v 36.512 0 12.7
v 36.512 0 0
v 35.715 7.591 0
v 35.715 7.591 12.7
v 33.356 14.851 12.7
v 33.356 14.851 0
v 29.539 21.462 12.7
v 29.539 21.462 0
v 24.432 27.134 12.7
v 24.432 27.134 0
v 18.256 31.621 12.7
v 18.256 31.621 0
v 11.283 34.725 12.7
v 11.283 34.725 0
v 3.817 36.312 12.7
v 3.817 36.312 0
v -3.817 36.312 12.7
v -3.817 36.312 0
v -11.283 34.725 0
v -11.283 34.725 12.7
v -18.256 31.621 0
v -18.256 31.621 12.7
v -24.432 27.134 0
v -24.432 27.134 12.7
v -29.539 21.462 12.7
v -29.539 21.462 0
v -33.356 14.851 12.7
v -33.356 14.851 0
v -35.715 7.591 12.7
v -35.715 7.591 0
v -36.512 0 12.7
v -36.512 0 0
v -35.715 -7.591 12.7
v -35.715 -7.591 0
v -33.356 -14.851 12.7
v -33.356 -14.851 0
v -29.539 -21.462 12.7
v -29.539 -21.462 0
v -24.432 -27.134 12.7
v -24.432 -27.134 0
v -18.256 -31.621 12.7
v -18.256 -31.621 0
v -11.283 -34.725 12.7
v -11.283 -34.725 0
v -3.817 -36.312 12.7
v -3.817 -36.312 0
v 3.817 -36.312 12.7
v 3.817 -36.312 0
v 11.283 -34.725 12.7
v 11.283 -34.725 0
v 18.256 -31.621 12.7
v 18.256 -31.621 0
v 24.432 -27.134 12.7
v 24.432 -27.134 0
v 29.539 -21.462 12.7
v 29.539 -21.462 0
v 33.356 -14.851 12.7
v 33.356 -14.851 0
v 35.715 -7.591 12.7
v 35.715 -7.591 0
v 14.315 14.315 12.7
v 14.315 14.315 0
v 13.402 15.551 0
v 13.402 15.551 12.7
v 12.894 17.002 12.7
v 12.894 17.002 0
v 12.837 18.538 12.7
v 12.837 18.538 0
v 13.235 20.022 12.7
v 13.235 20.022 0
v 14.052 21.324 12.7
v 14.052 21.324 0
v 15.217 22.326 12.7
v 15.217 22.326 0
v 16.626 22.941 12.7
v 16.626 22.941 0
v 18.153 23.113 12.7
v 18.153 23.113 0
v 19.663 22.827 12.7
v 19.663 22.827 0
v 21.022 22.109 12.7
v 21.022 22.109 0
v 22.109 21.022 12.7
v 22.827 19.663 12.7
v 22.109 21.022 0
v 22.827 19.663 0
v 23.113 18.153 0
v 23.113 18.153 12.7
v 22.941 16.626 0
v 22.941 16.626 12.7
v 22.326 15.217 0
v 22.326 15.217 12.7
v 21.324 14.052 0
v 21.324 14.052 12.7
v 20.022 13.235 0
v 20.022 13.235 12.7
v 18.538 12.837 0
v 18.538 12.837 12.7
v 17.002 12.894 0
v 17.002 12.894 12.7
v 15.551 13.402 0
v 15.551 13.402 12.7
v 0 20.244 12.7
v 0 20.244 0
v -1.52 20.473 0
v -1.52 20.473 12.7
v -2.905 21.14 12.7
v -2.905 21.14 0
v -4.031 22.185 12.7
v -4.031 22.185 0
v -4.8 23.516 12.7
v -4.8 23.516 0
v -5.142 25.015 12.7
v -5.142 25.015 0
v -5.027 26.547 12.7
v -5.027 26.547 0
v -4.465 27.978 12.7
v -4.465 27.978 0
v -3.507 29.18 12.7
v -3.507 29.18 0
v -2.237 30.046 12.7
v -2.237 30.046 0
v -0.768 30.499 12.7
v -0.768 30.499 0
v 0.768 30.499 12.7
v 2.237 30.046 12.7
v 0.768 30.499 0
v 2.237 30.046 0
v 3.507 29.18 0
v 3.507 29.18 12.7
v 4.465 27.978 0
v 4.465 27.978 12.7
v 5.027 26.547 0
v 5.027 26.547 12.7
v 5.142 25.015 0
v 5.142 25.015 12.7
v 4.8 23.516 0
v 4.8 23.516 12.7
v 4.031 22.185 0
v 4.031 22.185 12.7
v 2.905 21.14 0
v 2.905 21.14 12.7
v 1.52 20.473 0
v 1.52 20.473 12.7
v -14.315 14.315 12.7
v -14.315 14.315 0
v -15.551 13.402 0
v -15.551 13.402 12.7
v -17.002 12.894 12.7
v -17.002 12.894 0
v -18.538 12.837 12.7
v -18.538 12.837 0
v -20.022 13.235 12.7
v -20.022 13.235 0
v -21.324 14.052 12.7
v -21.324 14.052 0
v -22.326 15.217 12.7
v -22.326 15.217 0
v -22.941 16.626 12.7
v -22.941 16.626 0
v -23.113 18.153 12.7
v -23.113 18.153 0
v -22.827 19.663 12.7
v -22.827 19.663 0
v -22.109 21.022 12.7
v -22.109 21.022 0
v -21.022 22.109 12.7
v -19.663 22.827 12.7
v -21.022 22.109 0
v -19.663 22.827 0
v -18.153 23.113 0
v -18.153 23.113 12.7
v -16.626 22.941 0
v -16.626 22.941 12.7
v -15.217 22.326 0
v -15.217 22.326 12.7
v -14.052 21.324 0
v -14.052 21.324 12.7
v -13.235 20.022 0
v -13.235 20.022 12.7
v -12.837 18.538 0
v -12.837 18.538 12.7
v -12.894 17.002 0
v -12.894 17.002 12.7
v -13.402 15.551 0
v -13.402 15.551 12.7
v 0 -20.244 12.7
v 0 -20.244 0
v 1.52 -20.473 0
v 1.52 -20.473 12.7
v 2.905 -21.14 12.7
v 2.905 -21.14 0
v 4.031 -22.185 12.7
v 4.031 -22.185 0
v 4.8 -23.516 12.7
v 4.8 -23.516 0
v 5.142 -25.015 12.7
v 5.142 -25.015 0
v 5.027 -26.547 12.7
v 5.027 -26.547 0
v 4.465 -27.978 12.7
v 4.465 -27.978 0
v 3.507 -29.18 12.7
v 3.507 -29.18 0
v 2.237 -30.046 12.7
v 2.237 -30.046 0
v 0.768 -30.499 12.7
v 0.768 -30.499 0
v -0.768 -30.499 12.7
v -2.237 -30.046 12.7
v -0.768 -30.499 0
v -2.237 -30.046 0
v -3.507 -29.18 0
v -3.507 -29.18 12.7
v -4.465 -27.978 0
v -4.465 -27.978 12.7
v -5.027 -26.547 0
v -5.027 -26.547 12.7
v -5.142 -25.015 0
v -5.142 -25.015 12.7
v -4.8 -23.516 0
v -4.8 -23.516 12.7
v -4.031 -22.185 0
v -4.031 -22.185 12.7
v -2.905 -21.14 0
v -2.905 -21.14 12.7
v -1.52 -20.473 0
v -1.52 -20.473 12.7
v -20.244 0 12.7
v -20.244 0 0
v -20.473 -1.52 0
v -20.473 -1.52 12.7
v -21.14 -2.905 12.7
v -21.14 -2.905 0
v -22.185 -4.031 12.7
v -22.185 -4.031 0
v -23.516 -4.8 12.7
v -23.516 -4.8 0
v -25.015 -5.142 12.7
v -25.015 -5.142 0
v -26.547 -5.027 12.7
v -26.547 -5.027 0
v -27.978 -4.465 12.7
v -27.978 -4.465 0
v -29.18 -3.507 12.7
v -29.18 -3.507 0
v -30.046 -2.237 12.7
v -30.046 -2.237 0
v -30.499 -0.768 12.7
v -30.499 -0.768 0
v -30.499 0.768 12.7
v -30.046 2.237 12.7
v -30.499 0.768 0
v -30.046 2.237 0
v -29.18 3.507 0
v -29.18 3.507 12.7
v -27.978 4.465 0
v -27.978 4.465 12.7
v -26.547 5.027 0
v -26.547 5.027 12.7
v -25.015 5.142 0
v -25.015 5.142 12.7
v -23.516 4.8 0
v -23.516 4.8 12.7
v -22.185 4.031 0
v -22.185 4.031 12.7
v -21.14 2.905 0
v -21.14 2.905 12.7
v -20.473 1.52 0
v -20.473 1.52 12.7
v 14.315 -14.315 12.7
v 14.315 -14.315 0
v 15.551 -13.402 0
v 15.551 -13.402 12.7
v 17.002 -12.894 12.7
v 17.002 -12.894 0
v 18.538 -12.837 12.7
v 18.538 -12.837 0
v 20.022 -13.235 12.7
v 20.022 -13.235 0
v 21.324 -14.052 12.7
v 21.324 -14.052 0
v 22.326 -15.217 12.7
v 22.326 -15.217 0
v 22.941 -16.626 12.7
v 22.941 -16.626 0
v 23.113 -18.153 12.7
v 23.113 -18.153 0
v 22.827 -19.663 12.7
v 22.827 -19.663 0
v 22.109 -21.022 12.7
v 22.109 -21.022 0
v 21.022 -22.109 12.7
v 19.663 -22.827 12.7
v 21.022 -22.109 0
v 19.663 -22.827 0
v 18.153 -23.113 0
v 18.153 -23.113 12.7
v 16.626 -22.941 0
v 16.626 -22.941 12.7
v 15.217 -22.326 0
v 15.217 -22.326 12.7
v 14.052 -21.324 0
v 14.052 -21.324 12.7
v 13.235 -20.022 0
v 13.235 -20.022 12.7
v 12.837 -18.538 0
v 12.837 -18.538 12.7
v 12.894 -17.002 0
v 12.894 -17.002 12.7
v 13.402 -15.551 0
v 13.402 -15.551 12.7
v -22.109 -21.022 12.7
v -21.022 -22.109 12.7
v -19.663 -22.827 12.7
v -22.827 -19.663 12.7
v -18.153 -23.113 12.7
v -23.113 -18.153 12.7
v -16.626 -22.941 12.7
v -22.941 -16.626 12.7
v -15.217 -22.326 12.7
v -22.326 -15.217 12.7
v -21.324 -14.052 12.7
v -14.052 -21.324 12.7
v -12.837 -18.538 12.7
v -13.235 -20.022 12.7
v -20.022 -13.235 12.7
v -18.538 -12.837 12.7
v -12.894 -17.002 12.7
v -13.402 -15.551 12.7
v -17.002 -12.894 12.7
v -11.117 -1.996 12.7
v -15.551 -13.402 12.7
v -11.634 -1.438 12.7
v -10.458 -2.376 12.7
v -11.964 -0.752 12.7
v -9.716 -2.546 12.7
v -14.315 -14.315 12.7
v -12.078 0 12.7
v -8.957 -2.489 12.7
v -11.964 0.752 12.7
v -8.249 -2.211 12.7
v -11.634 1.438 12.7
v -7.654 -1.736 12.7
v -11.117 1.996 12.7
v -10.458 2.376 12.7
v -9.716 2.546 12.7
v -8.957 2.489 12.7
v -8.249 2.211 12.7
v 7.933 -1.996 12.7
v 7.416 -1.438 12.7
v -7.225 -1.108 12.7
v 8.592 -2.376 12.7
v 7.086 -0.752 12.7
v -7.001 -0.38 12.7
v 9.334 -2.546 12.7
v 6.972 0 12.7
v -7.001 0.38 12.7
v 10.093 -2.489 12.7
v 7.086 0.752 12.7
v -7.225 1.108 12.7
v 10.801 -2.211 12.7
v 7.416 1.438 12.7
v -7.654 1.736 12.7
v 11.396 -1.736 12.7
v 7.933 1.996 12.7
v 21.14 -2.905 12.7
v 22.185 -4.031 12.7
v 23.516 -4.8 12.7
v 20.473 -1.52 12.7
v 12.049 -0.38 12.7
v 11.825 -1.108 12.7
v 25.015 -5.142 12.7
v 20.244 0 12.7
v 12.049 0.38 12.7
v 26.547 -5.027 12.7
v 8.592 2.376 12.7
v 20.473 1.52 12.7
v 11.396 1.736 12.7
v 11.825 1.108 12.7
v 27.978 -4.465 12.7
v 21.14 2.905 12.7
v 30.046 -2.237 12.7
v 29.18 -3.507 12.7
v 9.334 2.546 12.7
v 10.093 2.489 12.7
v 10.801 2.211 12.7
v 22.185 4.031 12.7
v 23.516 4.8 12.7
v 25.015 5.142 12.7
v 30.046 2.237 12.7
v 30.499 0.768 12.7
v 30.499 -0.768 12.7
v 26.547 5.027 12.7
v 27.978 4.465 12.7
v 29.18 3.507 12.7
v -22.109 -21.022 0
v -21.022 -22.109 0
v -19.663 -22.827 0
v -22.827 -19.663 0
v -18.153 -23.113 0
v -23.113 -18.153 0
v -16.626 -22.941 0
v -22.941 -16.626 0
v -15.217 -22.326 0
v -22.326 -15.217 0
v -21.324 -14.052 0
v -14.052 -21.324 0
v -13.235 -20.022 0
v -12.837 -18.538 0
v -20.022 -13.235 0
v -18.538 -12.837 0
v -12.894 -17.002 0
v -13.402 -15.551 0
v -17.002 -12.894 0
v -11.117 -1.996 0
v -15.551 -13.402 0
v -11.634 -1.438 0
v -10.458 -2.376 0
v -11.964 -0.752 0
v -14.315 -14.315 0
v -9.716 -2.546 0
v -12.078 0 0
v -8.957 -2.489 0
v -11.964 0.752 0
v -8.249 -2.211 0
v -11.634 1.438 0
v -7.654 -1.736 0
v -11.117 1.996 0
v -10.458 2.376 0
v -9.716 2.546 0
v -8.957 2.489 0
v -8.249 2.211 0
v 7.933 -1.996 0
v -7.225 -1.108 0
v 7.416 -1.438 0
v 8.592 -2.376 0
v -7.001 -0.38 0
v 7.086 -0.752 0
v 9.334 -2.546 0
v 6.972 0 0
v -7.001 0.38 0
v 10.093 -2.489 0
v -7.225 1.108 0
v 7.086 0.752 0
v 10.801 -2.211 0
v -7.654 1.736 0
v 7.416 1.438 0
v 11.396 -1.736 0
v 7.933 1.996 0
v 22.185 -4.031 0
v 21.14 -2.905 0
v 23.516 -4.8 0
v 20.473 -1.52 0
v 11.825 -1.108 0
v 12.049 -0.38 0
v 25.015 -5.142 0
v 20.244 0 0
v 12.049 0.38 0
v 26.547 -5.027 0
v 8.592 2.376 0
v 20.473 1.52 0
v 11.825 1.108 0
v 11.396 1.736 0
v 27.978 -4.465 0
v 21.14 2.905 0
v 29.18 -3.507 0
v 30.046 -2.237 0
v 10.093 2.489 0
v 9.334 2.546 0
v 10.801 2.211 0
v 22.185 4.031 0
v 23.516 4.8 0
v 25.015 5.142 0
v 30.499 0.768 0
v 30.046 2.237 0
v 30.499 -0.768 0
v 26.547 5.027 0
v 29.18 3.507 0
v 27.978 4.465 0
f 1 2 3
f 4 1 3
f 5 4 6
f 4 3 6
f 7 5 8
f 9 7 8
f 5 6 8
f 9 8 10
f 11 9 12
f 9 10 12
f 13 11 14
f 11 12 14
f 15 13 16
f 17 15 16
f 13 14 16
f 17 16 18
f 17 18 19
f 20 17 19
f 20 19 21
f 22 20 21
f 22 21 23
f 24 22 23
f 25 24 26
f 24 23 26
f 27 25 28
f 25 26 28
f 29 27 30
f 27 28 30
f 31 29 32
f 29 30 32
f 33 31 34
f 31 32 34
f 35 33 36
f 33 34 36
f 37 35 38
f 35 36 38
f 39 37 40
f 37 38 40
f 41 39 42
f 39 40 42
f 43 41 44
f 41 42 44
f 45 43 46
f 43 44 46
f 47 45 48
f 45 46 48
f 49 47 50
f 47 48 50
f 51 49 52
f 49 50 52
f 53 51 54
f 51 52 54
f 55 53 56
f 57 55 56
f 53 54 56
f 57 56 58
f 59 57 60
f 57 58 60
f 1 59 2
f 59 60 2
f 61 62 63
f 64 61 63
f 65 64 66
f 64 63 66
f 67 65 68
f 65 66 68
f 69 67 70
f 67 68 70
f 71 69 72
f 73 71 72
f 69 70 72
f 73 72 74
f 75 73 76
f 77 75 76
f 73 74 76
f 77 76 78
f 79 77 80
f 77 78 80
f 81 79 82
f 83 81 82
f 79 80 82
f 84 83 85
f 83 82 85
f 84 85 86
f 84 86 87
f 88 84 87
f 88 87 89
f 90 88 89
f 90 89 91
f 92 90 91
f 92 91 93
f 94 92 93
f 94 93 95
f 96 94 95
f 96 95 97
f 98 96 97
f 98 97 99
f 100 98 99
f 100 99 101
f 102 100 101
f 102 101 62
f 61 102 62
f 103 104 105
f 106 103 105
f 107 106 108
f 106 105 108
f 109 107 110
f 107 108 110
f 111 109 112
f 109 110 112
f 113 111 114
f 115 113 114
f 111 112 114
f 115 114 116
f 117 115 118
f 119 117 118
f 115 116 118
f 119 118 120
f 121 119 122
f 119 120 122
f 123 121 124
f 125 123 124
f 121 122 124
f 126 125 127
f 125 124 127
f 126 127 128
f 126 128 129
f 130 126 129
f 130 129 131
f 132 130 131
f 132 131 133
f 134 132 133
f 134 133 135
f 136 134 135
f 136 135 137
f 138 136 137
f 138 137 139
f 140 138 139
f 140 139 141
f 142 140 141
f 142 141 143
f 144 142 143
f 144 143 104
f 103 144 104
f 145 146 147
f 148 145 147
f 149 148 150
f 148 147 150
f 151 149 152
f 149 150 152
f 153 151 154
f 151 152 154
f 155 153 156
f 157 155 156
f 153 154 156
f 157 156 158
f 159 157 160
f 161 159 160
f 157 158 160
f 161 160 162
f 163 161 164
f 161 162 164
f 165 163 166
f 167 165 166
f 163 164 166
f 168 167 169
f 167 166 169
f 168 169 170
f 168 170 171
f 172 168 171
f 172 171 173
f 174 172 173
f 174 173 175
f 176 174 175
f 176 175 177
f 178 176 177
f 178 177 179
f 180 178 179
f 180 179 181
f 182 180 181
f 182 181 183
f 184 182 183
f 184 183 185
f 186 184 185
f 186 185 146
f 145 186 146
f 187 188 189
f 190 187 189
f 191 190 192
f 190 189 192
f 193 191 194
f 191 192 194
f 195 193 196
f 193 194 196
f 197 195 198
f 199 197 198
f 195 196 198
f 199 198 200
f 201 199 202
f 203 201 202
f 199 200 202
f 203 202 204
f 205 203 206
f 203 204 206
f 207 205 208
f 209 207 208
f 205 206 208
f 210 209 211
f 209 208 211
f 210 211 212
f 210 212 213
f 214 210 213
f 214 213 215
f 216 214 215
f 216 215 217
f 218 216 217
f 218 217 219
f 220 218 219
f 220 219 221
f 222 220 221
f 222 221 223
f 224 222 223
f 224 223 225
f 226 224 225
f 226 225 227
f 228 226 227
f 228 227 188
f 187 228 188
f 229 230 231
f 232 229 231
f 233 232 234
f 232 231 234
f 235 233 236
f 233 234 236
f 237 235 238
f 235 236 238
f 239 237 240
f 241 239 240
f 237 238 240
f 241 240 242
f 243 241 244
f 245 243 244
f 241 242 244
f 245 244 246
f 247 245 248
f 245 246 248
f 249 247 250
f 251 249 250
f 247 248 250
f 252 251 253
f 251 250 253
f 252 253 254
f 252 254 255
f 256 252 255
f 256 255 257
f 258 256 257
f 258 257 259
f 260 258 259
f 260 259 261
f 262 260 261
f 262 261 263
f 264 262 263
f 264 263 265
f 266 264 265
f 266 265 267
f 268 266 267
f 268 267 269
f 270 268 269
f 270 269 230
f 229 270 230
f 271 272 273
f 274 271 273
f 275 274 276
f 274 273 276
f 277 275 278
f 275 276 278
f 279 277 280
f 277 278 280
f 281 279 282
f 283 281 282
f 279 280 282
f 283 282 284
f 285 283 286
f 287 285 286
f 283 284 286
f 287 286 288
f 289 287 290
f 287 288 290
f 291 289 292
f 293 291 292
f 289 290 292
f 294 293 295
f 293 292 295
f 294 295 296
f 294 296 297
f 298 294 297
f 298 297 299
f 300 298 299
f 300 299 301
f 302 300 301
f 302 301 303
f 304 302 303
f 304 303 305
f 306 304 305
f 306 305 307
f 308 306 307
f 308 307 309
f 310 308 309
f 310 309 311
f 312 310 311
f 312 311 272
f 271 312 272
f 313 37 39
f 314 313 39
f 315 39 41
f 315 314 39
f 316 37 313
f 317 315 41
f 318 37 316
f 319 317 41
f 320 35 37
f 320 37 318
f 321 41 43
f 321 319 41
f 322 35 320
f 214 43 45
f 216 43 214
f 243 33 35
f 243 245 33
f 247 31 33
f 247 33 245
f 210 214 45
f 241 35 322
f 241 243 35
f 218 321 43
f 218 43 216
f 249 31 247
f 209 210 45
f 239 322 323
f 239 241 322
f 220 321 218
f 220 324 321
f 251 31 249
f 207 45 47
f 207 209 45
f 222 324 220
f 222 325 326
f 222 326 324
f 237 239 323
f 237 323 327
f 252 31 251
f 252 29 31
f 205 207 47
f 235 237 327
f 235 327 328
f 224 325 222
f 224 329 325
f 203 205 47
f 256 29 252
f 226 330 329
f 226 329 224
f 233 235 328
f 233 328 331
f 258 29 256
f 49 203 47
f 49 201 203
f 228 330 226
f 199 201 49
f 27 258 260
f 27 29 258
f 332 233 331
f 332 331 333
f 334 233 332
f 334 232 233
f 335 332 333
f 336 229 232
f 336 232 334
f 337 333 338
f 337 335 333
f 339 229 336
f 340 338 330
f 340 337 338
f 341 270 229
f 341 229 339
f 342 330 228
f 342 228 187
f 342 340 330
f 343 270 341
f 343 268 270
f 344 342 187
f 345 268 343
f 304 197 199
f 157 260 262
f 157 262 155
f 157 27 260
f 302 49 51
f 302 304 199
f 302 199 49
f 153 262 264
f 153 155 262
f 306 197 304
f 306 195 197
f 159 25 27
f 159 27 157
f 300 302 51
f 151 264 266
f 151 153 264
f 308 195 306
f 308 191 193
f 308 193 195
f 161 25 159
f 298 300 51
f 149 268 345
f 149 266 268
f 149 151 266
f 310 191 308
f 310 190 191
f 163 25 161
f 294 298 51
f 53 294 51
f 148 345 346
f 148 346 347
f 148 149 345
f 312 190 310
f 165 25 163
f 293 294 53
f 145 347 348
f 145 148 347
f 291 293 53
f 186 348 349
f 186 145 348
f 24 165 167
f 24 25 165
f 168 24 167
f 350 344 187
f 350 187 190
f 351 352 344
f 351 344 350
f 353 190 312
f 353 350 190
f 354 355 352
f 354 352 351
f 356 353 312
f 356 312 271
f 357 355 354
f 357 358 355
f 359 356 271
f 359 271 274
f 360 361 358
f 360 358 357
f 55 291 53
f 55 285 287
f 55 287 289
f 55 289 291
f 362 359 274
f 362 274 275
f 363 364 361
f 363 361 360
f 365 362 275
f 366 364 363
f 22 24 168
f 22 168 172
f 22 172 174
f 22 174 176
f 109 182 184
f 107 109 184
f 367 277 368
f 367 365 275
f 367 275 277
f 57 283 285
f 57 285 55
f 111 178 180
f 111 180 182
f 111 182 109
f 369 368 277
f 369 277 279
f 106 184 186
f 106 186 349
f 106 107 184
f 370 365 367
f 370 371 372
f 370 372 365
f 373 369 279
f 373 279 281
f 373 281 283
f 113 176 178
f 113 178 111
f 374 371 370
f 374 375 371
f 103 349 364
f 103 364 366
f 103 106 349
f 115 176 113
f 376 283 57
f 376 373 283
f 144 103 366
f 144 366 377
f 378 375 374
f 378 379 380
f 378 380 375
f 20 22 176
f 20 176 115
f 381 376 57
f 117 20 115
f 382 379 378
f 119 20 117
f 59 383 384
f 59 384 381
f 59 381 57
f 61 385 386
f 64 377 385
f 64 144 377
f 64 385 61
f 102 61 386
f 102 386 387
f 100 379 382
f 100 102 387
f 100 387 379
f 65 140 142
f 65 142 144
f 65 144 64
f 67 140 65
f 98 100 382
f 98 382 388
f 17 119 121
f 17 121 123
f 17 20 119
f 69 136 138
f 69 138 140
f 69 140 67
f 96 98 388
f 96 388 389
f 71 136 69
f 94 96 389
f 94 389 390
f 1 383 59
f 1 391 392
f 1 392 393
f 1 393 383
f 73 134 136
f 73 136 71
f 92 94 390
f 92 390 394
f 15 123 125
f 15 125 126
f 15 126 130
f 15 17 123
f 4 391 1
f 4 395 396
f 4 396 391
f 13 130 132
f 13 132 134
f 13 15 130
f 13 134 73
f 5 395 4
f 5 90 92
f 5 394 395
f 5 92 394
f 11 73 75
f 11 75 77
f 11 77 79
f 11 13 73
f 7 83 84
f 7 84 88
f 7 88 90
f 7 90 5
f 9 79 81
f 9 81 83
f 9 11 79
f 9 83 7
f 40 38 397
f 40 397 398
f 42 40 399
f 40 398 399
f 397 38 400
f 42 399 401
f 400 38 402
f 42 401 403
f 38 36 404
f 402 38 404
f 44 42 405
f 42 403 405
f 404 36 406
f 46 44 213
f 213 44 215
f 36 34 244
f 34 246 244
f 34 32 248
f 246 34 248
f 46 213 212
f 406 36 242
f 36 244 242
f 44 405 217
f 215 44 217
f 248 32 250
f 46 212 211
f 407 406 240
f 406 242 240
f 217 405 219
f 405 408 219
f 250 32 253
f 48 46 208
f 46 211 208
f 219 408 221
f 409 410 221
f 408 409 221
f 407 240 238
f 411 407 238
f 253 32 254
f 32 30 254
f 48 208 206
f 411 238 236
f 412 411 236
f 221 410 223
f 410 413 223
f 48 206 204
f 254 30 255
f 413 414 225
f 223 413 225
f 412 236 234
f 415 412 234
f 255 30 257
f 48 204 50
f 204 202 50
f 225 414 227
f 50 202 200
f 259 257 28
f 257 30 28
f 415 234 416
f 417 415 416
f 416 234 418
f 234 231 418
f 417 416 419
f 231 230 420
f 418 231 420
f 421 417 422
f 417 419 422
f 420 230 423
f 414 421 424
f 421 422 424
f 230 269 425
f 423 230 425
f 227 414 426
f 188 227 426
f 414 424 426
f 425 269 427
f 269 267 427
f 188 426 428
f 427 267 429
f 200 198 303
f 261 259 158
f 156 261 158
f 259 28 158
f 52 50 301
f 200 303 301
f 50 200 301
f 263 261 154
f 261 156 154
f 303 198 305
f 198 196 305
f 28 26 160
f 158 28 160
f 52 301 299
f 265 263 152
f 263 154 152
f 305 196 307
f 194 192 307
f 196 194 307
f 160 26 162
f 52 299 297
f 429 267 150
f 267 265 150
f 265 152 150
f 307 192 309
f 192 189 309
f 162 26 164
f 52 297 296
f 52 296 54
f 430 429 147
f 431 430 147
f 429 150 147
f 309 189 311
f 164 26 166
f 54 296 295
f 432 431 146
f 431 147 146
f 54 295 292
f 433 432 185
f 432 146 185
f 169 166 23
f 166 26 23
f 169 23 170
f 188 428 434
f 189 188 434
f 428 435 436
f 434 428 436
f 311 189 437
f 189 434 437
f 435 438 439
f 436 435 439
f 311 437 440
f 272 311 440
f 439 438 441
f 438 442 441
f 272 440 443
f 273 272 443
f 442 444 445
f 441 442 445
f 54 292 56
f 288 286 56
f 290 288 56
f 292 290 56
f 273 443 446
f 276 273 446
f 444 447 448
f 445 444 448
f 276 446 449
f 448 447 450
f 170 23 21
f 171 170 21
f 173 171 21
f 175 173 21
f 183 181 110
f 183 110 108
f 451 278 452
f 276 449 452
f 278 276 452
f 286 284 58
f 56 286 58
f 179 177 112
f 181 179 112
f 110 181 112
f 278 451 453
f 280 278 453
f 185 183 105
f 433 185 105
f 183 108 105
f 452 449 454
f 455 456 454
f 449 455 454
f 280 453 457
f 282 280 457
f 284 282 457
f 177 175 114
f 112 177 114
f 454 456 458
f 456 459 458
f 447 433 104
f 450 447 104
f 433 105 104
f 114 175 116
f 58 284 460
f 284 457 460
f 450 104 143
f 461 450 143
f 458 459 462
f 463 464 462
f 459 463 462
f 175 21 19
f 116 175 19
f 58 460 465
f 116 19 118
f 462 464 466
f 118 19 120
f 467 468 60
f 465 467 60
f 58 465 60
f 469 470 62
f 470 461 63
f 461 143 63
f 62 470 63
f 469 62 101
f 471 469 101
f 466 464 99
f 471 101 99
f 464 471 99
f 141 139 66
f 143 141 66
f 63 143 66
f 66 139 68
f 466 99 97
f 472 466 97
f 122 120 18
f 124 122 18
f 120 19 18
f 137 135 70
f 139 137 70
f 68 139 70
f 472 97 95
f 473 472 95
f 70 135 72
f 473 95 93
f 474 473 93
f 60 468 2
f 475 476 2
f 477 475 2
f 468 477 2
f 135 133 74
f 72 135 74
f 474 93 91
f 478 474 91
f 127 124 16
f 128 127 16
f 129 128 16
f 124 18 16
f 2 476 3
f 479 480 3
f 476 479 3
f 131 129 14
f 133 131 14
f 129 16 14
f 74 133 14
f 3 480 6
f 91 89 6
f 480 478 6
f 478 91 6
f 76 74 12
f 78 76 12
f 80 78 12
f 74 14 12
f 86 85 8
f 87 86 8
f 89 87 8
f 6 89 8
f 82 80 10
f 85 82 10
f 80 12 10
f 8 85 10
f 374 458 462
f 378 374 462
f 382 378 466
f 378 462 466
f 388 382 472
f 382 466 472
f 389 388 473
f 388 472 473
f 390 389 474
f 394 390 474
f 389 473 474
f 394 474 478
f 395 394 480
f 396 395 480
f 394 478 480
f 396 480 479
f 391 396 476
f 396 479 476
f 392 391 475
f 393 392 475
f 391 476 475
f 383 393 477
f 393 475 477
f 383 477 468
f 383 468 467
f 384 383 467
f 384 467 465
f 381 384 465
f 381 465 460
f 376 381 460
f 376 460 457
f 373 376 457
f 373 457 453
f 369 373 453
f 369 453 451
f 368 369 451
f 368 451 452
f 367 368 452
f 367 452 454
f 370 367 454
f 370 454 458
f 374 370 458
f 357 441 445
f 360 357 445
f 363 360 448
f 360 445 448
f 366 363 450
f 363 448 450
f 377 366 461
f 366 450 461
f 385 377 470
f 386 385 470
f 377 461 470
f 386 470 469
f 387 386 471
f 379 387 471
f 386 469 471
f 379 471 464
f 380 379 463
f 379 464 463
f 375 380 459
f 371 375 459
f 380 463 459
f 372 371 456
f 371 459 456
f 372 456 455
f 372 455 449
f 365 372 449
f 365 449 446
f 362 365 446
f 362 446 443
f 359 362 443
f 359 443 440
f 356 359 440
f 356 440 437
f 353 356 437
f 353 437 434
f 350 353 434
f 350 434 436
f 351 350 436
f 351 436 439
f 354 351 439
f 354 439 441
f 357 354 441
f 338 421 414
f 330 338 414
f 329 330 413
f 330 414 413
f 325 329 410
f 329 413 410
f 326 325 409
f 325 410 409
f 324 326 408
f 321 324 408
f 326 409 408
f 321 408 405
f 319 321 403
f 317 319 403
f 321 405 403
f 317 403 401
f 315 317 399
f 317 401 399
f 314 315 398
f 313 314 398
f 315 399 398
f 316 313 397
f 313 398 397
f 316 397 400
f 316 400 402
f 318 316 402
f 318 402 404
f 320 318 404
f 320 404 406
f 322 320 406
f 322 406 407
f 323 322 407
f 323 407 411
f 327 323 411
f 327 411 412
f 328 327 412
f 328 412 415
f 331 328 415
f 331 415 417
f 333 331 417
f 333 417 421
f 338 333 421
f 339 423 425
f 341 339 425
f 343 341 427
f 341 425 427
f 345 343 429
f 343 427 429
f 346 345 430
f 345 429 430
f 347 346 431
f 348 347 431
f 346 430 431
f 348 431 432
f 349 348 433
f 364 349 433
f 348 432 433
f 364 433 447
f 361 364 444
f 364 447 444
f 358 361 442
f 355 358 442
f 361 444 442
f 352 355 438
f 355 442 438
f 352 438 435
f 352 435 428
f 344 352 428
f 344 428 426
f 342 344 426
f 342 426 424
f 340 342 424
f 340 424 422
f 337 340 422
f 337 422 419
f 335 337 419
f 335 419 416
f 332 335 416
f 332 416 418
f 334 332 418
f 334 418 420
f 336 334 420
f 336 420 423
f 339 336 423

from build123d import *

# Parameters (mm, degrees)
SKETCH1_R                    = 36.5125
BOSS_EXTRUDE1_DEPTH          = 12.7
F_1_4_20_TAPPED_HOLE1_D      = 5.1054
F_3_8_0_375_DIAMETER_HOLE1_D = 10.3124
CIRPATTERN1_COUNT            = 8


with BuildPart() as part:
    # Sketch1 → Boss-Extrude1 (new body)
    with BuildSketch(Plane.XY):
        Circle(SKETCH1_R)
    extrude(amount=BOSS_EXTRUDE1_DEPTH)

    # 1_4-20 Tapped Hole1 (through all)
    with Locations(Plane.XY.offset(12.7)):
        with Locations((9.525, 0), (-9.525, 0)):
            Hole(F_1_4_20_TAPPED_HOLE1_D / 2)

    # 3_8 _0.375_ Diameter Hole1 (through all)
    with Locations(Plane.XY.offset(12.7)):
        with Locations((25.4, 0)):
            f_3_8_0_375_diameter_hole1 = Hole(F_3_8_0_375_DIAMETER_HOLE1_D / 2)

    # CirPattern1: 3_8 _0.375_ Diameter Hole1 ×8 about axis
    cirpattern1_axis = Axis((0, 0, 0), (0, 0, 1))
    for i in range(1, CIRPATTERN1_COUNT):
        add(f_3_8_0_375_diameter_hole1.rotate(cirpattern1_axis, i * 360 / CIRPATTERN1_COUNT), mode=Mode.SUBTRACT)


solid = part.part
